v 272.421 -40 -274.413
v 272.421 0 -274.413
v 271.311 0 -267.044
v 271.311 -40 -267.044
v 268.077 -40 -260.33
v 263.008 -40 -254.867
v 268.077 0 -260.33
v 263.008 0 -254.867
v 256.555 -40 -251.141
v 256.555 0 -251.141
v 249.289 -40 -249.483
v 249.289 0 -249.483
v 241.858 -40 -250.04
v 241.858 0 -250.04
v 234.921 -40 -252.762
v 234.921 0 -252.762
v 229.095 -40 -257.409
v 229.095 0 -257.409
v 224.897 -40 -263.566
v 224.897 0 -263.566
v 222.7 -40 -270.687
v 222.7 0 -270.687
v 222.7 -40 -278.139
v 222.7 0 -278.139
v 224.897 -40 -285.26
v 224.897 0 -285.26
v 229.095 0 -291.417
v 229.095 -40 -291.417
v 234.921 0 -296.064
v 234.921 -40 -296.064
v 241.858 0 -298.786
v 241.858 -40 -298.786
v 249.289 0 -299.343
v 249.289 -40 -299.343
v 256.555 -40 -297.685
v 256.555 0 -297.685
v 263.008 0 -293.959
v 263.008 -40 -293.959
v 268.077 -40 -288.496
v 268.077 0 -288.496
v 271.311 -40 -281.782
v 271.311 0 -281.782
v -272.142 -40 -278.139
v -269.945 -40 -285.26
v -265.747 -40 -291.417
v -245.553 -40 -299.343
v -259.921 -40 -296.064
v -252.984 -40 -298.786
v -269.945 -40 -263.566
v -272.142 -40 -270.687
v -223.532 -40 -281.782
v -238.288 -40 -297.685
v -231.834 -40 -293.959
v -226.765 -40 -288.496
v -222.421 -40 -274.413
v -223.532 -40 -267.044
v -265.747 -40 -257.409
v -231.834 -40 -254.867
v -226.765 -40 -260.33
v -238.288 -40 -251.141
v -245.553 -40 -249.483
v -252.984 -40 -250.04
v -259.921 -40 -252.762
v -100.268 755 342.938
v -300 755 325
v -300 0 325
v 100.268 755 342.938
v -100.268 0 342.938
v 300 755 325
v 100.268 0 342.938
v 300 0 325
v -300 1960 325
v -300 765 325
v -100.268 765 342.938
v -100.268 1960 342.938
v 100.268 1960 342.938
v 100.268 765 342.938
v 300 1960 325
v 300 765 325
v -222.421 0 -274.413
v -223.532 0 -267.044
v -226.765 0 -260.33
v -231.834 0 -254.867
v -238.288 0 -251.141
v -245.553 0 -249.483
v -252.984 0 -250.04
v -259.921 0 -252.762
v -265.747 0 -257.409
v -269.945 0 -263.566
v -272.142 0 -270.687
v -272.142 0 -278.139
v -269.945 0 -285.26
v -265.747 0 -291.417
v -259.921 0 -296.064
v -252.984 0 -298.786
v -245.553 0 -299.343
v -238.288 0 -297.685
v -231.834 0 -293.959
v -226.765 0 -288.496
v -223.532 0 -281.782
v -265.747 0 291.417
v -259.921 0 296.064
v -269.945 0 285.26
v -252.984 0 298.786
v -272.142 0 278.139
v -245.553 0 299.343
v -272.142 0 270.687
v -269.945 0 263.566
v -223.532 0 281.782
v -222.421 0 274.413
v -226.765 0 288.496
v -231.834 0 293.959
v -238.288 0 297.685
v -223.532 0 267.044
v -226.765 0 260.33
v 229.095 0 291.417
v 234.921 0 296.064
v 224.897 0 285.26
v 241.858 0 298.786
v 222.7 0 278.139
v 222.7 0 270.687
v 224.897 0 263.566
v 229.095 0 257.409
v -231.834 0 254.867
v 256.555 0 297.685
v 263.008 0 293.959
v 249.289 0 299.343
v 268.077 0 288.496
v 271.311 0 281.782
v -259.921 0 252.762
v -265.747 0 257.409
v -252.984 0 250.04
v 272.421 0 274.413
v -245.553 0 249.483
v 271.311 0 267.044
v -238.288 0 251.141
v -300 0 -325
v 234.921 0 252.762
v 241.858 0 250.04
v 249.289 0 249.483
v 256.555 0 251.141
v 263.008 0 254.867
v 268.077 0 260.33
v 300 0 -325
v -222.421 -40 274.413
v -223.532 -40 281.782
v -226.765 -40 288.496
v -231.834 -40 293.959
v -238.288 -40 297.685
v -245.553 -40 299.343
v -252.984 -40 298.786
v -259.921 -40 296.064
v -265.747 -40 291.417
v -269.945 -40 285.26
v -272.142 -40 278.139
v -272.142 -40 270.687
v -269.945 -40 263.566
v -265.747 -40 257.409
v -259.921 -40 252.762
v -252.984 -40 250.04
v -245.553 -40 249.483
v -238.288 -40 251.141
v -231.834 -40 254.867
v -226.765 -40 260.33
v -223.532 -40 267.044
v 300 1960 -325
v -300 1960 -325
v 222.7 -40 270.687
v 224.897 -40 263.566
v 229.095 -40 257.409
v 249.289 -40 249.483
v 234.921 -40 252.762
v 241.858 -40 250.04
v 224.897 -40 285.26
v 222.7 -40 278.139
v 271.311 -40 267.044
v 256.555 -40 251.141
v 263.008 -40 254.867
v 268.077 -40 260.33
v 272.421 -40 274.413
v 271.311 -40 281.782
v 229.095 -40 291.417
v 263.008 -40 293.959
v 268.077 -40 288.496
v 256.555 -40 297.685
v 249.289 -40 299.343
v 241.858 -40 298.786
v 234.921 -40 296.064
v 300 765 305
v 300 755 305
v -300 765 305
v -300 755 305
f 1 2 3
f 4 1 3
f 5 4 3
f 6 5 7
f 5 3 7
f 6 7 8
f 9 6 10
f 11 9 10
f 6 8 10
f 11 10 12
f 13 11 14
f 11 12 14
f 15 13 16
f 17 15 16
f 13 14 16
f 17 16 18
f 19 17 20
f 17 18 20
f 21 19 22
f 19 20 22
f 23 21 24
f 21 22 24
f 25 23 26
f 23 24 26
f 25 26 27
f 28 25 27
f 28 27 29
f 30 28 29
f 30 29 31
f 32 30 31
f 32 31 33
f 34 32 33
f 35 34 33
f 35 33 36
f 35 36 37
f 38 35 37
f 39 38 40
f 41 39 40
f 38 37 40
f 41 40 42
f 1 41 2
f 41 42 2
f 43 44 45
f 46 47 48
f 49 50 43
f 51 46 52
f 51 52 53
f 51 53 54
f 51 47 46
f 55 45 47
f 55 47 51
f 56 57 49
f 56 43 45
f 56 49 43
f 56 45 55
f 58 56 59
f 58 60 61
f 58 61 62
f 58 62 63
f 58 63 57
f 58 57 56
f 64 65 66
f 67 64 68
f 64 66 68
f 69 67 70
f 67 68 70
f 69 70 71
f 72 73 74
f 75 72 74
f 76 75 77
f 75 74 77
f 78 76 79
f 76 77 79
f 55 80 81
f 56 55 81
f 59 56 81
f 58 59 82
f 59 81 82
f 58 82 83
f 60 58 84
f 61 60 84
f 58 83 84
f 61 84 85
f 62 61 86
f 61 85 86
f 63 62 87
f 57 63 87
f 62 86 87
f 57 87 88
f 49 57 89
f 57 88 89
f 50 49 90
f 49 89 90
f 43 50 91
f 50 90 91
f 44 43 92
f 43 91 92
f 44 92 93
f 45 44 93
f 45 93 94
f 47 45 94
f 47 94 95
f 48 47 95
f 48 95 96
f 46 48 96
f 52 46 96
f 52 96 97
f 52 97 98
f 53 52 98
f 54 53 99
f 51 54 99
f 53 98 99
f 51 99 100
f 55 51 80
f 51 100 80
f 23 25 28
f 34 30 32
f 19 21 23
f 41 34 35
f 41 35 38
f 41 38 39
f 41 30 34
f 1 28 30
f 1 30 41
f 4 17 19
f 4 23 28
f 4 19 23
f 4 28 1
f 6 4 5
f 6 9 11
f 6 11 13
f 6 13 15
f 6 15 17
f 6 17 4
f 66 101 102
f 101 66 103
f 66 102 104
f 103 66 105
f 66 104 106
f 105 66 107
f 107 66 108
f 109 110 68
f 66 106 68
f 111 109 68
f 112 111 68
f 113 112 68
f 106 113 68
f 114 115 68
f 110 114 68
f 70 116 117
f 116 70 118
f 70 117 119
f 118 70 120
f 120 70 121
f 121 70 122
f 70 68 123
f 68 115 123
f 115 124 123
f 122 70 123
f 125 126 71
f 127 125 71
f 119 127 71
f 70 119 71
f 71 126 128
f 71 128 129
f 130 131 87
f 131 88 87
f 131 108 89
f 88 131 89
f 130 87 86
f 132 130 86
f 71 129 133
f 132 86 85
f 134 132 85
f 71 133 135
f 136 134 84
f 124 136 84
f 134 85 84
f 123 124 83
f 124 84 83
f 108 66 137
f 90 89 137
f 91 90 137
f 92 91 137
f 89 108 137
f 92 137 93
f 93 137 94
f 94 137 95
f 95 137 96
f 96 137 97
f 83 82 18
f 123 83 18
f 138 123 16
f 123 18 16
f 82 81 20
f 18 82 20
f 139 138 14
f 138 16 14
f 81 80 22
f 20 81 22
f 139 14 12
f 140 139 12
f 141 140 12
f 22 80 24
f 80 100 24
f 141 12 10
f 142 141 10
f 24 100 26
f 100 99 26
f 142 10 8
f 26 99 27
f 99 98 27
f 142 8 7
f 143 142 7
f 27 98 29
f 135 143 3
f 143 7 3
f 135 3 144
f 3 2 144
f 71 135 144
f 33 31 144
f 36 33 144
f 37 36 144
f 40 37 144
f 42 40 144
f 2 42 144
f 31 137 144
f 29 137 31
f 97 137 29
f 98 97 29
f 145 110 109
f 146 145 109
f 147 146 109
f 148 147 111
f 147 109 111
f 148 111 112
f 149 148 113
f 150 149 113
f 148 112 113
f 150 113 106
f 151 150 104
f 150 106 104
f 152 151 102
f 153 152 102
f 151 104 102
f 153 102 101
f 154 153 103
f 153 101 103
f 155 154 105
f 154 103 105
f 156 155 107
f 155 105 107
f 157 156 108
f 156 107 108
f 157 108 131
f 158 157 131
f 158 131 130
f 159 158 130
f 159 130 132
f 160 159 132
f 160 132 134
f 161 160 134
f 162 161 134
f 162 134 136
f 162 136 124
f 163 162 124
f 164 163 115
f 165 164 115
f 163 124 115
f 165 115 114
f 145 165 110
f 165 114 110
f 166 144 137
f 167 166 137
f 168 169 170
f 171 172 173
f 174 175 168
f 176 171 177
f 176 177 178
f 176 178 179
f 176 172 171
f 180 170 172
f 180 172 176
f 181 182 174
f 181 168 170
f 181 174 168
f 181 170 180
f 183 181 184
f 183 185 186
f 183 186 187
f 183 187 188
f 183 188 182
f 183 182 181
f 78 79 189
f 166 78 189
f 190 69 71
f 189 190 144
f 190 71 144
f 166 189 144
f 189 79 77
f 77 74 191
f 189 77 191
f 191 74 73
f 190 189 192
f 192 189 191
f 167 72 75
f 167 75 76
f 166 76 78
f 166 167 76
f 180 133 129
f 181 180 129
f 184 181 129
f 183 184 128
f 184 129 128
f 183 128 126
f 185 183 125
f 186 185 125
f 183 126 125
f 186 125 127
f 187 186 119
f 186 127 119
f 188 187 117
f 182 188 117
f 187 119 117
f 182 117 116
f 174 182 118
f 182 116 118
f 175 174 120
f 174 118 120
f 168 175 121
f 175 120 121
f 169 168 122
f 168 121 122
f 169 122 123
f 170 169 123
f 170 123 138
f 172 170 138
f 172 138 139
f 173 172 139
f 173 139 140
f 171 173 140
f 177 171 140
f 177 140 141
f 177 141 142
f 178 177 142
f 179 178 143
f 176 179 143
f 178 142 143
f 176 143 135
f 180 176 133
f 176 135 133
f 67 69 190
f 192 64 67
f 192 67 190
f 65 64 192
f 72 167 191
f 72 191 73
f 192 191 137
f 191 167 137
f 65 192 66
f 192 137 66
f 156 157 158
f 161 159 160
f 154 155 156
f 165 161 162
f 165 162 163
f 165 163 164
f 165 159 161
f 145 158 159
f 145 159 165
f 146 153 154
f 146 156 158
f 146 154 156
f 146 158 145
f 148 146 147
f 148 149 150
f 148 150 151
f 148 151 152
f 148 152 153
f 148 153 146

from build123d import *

# Parameters (mm, degrees)
BOSS_EXTRUDE1_DEPTH = 1960
SKETCH2_R           = 25
BOSS_EXTRUDE2_DEPTH = 40
SKETCH3_W           = 1014.048392478
SKETCH3_H           = 10
CUT_EXTRUDE1_DEPTH  = 170


with BuildPart() as part:
    # Sketch1 → Boss-Extrude1 (new body)
    with BuildSketch(Plane(origin=(0, 0, 0), x_dir=(1, 0, 0), z_dir=(0, 1, 0))):
        with BuildLine():
            Line((300, -325), (300, 325))
            Line((300, 325), (-300, 325))
            Line((-300, 325), (-300, -325))
            ThreePointArc((-300, -325), (0, -345.183114428), (300, -325))
        make_face()
    extrude(amount=BOSS_EXTRUDE1_DEPTH)

    # Sketch2 → Boss-Extrude2 (add)
    with BuildSketch(Plane.XZ):
        with Locations((-247.421181531, 274.413092674)):
            Circle(SKETCH2_R)
        with Locations((247.421181531, 274.413092674)):
            Circle(SKETCH2_R)
        with Locations((247.421181531, -274.413092674)):
            Circle(SKETCH2_R)
        with Locations((-247.421181531, -274.413092674)):
            Circle(SKETCH2_R)
    extrude(amount=BOSS_EXTRUDE2_DEPTH)

    # Sketch3 → Cut-Extrude1 (cut)
    with BuildSketch(Plane(origin=(0, 0, 475), x_dir=(-1, 0, 0), z_dir=(0, 0, -1))):
        with Locations((0, 760)):
            Rectangle(SKETCH3_W, SKETCH3_H)
    extrude(amount=CUT_EXTRUDE1_DEPTH, mode=Mode.SUBTRACT)


solid = part.part
